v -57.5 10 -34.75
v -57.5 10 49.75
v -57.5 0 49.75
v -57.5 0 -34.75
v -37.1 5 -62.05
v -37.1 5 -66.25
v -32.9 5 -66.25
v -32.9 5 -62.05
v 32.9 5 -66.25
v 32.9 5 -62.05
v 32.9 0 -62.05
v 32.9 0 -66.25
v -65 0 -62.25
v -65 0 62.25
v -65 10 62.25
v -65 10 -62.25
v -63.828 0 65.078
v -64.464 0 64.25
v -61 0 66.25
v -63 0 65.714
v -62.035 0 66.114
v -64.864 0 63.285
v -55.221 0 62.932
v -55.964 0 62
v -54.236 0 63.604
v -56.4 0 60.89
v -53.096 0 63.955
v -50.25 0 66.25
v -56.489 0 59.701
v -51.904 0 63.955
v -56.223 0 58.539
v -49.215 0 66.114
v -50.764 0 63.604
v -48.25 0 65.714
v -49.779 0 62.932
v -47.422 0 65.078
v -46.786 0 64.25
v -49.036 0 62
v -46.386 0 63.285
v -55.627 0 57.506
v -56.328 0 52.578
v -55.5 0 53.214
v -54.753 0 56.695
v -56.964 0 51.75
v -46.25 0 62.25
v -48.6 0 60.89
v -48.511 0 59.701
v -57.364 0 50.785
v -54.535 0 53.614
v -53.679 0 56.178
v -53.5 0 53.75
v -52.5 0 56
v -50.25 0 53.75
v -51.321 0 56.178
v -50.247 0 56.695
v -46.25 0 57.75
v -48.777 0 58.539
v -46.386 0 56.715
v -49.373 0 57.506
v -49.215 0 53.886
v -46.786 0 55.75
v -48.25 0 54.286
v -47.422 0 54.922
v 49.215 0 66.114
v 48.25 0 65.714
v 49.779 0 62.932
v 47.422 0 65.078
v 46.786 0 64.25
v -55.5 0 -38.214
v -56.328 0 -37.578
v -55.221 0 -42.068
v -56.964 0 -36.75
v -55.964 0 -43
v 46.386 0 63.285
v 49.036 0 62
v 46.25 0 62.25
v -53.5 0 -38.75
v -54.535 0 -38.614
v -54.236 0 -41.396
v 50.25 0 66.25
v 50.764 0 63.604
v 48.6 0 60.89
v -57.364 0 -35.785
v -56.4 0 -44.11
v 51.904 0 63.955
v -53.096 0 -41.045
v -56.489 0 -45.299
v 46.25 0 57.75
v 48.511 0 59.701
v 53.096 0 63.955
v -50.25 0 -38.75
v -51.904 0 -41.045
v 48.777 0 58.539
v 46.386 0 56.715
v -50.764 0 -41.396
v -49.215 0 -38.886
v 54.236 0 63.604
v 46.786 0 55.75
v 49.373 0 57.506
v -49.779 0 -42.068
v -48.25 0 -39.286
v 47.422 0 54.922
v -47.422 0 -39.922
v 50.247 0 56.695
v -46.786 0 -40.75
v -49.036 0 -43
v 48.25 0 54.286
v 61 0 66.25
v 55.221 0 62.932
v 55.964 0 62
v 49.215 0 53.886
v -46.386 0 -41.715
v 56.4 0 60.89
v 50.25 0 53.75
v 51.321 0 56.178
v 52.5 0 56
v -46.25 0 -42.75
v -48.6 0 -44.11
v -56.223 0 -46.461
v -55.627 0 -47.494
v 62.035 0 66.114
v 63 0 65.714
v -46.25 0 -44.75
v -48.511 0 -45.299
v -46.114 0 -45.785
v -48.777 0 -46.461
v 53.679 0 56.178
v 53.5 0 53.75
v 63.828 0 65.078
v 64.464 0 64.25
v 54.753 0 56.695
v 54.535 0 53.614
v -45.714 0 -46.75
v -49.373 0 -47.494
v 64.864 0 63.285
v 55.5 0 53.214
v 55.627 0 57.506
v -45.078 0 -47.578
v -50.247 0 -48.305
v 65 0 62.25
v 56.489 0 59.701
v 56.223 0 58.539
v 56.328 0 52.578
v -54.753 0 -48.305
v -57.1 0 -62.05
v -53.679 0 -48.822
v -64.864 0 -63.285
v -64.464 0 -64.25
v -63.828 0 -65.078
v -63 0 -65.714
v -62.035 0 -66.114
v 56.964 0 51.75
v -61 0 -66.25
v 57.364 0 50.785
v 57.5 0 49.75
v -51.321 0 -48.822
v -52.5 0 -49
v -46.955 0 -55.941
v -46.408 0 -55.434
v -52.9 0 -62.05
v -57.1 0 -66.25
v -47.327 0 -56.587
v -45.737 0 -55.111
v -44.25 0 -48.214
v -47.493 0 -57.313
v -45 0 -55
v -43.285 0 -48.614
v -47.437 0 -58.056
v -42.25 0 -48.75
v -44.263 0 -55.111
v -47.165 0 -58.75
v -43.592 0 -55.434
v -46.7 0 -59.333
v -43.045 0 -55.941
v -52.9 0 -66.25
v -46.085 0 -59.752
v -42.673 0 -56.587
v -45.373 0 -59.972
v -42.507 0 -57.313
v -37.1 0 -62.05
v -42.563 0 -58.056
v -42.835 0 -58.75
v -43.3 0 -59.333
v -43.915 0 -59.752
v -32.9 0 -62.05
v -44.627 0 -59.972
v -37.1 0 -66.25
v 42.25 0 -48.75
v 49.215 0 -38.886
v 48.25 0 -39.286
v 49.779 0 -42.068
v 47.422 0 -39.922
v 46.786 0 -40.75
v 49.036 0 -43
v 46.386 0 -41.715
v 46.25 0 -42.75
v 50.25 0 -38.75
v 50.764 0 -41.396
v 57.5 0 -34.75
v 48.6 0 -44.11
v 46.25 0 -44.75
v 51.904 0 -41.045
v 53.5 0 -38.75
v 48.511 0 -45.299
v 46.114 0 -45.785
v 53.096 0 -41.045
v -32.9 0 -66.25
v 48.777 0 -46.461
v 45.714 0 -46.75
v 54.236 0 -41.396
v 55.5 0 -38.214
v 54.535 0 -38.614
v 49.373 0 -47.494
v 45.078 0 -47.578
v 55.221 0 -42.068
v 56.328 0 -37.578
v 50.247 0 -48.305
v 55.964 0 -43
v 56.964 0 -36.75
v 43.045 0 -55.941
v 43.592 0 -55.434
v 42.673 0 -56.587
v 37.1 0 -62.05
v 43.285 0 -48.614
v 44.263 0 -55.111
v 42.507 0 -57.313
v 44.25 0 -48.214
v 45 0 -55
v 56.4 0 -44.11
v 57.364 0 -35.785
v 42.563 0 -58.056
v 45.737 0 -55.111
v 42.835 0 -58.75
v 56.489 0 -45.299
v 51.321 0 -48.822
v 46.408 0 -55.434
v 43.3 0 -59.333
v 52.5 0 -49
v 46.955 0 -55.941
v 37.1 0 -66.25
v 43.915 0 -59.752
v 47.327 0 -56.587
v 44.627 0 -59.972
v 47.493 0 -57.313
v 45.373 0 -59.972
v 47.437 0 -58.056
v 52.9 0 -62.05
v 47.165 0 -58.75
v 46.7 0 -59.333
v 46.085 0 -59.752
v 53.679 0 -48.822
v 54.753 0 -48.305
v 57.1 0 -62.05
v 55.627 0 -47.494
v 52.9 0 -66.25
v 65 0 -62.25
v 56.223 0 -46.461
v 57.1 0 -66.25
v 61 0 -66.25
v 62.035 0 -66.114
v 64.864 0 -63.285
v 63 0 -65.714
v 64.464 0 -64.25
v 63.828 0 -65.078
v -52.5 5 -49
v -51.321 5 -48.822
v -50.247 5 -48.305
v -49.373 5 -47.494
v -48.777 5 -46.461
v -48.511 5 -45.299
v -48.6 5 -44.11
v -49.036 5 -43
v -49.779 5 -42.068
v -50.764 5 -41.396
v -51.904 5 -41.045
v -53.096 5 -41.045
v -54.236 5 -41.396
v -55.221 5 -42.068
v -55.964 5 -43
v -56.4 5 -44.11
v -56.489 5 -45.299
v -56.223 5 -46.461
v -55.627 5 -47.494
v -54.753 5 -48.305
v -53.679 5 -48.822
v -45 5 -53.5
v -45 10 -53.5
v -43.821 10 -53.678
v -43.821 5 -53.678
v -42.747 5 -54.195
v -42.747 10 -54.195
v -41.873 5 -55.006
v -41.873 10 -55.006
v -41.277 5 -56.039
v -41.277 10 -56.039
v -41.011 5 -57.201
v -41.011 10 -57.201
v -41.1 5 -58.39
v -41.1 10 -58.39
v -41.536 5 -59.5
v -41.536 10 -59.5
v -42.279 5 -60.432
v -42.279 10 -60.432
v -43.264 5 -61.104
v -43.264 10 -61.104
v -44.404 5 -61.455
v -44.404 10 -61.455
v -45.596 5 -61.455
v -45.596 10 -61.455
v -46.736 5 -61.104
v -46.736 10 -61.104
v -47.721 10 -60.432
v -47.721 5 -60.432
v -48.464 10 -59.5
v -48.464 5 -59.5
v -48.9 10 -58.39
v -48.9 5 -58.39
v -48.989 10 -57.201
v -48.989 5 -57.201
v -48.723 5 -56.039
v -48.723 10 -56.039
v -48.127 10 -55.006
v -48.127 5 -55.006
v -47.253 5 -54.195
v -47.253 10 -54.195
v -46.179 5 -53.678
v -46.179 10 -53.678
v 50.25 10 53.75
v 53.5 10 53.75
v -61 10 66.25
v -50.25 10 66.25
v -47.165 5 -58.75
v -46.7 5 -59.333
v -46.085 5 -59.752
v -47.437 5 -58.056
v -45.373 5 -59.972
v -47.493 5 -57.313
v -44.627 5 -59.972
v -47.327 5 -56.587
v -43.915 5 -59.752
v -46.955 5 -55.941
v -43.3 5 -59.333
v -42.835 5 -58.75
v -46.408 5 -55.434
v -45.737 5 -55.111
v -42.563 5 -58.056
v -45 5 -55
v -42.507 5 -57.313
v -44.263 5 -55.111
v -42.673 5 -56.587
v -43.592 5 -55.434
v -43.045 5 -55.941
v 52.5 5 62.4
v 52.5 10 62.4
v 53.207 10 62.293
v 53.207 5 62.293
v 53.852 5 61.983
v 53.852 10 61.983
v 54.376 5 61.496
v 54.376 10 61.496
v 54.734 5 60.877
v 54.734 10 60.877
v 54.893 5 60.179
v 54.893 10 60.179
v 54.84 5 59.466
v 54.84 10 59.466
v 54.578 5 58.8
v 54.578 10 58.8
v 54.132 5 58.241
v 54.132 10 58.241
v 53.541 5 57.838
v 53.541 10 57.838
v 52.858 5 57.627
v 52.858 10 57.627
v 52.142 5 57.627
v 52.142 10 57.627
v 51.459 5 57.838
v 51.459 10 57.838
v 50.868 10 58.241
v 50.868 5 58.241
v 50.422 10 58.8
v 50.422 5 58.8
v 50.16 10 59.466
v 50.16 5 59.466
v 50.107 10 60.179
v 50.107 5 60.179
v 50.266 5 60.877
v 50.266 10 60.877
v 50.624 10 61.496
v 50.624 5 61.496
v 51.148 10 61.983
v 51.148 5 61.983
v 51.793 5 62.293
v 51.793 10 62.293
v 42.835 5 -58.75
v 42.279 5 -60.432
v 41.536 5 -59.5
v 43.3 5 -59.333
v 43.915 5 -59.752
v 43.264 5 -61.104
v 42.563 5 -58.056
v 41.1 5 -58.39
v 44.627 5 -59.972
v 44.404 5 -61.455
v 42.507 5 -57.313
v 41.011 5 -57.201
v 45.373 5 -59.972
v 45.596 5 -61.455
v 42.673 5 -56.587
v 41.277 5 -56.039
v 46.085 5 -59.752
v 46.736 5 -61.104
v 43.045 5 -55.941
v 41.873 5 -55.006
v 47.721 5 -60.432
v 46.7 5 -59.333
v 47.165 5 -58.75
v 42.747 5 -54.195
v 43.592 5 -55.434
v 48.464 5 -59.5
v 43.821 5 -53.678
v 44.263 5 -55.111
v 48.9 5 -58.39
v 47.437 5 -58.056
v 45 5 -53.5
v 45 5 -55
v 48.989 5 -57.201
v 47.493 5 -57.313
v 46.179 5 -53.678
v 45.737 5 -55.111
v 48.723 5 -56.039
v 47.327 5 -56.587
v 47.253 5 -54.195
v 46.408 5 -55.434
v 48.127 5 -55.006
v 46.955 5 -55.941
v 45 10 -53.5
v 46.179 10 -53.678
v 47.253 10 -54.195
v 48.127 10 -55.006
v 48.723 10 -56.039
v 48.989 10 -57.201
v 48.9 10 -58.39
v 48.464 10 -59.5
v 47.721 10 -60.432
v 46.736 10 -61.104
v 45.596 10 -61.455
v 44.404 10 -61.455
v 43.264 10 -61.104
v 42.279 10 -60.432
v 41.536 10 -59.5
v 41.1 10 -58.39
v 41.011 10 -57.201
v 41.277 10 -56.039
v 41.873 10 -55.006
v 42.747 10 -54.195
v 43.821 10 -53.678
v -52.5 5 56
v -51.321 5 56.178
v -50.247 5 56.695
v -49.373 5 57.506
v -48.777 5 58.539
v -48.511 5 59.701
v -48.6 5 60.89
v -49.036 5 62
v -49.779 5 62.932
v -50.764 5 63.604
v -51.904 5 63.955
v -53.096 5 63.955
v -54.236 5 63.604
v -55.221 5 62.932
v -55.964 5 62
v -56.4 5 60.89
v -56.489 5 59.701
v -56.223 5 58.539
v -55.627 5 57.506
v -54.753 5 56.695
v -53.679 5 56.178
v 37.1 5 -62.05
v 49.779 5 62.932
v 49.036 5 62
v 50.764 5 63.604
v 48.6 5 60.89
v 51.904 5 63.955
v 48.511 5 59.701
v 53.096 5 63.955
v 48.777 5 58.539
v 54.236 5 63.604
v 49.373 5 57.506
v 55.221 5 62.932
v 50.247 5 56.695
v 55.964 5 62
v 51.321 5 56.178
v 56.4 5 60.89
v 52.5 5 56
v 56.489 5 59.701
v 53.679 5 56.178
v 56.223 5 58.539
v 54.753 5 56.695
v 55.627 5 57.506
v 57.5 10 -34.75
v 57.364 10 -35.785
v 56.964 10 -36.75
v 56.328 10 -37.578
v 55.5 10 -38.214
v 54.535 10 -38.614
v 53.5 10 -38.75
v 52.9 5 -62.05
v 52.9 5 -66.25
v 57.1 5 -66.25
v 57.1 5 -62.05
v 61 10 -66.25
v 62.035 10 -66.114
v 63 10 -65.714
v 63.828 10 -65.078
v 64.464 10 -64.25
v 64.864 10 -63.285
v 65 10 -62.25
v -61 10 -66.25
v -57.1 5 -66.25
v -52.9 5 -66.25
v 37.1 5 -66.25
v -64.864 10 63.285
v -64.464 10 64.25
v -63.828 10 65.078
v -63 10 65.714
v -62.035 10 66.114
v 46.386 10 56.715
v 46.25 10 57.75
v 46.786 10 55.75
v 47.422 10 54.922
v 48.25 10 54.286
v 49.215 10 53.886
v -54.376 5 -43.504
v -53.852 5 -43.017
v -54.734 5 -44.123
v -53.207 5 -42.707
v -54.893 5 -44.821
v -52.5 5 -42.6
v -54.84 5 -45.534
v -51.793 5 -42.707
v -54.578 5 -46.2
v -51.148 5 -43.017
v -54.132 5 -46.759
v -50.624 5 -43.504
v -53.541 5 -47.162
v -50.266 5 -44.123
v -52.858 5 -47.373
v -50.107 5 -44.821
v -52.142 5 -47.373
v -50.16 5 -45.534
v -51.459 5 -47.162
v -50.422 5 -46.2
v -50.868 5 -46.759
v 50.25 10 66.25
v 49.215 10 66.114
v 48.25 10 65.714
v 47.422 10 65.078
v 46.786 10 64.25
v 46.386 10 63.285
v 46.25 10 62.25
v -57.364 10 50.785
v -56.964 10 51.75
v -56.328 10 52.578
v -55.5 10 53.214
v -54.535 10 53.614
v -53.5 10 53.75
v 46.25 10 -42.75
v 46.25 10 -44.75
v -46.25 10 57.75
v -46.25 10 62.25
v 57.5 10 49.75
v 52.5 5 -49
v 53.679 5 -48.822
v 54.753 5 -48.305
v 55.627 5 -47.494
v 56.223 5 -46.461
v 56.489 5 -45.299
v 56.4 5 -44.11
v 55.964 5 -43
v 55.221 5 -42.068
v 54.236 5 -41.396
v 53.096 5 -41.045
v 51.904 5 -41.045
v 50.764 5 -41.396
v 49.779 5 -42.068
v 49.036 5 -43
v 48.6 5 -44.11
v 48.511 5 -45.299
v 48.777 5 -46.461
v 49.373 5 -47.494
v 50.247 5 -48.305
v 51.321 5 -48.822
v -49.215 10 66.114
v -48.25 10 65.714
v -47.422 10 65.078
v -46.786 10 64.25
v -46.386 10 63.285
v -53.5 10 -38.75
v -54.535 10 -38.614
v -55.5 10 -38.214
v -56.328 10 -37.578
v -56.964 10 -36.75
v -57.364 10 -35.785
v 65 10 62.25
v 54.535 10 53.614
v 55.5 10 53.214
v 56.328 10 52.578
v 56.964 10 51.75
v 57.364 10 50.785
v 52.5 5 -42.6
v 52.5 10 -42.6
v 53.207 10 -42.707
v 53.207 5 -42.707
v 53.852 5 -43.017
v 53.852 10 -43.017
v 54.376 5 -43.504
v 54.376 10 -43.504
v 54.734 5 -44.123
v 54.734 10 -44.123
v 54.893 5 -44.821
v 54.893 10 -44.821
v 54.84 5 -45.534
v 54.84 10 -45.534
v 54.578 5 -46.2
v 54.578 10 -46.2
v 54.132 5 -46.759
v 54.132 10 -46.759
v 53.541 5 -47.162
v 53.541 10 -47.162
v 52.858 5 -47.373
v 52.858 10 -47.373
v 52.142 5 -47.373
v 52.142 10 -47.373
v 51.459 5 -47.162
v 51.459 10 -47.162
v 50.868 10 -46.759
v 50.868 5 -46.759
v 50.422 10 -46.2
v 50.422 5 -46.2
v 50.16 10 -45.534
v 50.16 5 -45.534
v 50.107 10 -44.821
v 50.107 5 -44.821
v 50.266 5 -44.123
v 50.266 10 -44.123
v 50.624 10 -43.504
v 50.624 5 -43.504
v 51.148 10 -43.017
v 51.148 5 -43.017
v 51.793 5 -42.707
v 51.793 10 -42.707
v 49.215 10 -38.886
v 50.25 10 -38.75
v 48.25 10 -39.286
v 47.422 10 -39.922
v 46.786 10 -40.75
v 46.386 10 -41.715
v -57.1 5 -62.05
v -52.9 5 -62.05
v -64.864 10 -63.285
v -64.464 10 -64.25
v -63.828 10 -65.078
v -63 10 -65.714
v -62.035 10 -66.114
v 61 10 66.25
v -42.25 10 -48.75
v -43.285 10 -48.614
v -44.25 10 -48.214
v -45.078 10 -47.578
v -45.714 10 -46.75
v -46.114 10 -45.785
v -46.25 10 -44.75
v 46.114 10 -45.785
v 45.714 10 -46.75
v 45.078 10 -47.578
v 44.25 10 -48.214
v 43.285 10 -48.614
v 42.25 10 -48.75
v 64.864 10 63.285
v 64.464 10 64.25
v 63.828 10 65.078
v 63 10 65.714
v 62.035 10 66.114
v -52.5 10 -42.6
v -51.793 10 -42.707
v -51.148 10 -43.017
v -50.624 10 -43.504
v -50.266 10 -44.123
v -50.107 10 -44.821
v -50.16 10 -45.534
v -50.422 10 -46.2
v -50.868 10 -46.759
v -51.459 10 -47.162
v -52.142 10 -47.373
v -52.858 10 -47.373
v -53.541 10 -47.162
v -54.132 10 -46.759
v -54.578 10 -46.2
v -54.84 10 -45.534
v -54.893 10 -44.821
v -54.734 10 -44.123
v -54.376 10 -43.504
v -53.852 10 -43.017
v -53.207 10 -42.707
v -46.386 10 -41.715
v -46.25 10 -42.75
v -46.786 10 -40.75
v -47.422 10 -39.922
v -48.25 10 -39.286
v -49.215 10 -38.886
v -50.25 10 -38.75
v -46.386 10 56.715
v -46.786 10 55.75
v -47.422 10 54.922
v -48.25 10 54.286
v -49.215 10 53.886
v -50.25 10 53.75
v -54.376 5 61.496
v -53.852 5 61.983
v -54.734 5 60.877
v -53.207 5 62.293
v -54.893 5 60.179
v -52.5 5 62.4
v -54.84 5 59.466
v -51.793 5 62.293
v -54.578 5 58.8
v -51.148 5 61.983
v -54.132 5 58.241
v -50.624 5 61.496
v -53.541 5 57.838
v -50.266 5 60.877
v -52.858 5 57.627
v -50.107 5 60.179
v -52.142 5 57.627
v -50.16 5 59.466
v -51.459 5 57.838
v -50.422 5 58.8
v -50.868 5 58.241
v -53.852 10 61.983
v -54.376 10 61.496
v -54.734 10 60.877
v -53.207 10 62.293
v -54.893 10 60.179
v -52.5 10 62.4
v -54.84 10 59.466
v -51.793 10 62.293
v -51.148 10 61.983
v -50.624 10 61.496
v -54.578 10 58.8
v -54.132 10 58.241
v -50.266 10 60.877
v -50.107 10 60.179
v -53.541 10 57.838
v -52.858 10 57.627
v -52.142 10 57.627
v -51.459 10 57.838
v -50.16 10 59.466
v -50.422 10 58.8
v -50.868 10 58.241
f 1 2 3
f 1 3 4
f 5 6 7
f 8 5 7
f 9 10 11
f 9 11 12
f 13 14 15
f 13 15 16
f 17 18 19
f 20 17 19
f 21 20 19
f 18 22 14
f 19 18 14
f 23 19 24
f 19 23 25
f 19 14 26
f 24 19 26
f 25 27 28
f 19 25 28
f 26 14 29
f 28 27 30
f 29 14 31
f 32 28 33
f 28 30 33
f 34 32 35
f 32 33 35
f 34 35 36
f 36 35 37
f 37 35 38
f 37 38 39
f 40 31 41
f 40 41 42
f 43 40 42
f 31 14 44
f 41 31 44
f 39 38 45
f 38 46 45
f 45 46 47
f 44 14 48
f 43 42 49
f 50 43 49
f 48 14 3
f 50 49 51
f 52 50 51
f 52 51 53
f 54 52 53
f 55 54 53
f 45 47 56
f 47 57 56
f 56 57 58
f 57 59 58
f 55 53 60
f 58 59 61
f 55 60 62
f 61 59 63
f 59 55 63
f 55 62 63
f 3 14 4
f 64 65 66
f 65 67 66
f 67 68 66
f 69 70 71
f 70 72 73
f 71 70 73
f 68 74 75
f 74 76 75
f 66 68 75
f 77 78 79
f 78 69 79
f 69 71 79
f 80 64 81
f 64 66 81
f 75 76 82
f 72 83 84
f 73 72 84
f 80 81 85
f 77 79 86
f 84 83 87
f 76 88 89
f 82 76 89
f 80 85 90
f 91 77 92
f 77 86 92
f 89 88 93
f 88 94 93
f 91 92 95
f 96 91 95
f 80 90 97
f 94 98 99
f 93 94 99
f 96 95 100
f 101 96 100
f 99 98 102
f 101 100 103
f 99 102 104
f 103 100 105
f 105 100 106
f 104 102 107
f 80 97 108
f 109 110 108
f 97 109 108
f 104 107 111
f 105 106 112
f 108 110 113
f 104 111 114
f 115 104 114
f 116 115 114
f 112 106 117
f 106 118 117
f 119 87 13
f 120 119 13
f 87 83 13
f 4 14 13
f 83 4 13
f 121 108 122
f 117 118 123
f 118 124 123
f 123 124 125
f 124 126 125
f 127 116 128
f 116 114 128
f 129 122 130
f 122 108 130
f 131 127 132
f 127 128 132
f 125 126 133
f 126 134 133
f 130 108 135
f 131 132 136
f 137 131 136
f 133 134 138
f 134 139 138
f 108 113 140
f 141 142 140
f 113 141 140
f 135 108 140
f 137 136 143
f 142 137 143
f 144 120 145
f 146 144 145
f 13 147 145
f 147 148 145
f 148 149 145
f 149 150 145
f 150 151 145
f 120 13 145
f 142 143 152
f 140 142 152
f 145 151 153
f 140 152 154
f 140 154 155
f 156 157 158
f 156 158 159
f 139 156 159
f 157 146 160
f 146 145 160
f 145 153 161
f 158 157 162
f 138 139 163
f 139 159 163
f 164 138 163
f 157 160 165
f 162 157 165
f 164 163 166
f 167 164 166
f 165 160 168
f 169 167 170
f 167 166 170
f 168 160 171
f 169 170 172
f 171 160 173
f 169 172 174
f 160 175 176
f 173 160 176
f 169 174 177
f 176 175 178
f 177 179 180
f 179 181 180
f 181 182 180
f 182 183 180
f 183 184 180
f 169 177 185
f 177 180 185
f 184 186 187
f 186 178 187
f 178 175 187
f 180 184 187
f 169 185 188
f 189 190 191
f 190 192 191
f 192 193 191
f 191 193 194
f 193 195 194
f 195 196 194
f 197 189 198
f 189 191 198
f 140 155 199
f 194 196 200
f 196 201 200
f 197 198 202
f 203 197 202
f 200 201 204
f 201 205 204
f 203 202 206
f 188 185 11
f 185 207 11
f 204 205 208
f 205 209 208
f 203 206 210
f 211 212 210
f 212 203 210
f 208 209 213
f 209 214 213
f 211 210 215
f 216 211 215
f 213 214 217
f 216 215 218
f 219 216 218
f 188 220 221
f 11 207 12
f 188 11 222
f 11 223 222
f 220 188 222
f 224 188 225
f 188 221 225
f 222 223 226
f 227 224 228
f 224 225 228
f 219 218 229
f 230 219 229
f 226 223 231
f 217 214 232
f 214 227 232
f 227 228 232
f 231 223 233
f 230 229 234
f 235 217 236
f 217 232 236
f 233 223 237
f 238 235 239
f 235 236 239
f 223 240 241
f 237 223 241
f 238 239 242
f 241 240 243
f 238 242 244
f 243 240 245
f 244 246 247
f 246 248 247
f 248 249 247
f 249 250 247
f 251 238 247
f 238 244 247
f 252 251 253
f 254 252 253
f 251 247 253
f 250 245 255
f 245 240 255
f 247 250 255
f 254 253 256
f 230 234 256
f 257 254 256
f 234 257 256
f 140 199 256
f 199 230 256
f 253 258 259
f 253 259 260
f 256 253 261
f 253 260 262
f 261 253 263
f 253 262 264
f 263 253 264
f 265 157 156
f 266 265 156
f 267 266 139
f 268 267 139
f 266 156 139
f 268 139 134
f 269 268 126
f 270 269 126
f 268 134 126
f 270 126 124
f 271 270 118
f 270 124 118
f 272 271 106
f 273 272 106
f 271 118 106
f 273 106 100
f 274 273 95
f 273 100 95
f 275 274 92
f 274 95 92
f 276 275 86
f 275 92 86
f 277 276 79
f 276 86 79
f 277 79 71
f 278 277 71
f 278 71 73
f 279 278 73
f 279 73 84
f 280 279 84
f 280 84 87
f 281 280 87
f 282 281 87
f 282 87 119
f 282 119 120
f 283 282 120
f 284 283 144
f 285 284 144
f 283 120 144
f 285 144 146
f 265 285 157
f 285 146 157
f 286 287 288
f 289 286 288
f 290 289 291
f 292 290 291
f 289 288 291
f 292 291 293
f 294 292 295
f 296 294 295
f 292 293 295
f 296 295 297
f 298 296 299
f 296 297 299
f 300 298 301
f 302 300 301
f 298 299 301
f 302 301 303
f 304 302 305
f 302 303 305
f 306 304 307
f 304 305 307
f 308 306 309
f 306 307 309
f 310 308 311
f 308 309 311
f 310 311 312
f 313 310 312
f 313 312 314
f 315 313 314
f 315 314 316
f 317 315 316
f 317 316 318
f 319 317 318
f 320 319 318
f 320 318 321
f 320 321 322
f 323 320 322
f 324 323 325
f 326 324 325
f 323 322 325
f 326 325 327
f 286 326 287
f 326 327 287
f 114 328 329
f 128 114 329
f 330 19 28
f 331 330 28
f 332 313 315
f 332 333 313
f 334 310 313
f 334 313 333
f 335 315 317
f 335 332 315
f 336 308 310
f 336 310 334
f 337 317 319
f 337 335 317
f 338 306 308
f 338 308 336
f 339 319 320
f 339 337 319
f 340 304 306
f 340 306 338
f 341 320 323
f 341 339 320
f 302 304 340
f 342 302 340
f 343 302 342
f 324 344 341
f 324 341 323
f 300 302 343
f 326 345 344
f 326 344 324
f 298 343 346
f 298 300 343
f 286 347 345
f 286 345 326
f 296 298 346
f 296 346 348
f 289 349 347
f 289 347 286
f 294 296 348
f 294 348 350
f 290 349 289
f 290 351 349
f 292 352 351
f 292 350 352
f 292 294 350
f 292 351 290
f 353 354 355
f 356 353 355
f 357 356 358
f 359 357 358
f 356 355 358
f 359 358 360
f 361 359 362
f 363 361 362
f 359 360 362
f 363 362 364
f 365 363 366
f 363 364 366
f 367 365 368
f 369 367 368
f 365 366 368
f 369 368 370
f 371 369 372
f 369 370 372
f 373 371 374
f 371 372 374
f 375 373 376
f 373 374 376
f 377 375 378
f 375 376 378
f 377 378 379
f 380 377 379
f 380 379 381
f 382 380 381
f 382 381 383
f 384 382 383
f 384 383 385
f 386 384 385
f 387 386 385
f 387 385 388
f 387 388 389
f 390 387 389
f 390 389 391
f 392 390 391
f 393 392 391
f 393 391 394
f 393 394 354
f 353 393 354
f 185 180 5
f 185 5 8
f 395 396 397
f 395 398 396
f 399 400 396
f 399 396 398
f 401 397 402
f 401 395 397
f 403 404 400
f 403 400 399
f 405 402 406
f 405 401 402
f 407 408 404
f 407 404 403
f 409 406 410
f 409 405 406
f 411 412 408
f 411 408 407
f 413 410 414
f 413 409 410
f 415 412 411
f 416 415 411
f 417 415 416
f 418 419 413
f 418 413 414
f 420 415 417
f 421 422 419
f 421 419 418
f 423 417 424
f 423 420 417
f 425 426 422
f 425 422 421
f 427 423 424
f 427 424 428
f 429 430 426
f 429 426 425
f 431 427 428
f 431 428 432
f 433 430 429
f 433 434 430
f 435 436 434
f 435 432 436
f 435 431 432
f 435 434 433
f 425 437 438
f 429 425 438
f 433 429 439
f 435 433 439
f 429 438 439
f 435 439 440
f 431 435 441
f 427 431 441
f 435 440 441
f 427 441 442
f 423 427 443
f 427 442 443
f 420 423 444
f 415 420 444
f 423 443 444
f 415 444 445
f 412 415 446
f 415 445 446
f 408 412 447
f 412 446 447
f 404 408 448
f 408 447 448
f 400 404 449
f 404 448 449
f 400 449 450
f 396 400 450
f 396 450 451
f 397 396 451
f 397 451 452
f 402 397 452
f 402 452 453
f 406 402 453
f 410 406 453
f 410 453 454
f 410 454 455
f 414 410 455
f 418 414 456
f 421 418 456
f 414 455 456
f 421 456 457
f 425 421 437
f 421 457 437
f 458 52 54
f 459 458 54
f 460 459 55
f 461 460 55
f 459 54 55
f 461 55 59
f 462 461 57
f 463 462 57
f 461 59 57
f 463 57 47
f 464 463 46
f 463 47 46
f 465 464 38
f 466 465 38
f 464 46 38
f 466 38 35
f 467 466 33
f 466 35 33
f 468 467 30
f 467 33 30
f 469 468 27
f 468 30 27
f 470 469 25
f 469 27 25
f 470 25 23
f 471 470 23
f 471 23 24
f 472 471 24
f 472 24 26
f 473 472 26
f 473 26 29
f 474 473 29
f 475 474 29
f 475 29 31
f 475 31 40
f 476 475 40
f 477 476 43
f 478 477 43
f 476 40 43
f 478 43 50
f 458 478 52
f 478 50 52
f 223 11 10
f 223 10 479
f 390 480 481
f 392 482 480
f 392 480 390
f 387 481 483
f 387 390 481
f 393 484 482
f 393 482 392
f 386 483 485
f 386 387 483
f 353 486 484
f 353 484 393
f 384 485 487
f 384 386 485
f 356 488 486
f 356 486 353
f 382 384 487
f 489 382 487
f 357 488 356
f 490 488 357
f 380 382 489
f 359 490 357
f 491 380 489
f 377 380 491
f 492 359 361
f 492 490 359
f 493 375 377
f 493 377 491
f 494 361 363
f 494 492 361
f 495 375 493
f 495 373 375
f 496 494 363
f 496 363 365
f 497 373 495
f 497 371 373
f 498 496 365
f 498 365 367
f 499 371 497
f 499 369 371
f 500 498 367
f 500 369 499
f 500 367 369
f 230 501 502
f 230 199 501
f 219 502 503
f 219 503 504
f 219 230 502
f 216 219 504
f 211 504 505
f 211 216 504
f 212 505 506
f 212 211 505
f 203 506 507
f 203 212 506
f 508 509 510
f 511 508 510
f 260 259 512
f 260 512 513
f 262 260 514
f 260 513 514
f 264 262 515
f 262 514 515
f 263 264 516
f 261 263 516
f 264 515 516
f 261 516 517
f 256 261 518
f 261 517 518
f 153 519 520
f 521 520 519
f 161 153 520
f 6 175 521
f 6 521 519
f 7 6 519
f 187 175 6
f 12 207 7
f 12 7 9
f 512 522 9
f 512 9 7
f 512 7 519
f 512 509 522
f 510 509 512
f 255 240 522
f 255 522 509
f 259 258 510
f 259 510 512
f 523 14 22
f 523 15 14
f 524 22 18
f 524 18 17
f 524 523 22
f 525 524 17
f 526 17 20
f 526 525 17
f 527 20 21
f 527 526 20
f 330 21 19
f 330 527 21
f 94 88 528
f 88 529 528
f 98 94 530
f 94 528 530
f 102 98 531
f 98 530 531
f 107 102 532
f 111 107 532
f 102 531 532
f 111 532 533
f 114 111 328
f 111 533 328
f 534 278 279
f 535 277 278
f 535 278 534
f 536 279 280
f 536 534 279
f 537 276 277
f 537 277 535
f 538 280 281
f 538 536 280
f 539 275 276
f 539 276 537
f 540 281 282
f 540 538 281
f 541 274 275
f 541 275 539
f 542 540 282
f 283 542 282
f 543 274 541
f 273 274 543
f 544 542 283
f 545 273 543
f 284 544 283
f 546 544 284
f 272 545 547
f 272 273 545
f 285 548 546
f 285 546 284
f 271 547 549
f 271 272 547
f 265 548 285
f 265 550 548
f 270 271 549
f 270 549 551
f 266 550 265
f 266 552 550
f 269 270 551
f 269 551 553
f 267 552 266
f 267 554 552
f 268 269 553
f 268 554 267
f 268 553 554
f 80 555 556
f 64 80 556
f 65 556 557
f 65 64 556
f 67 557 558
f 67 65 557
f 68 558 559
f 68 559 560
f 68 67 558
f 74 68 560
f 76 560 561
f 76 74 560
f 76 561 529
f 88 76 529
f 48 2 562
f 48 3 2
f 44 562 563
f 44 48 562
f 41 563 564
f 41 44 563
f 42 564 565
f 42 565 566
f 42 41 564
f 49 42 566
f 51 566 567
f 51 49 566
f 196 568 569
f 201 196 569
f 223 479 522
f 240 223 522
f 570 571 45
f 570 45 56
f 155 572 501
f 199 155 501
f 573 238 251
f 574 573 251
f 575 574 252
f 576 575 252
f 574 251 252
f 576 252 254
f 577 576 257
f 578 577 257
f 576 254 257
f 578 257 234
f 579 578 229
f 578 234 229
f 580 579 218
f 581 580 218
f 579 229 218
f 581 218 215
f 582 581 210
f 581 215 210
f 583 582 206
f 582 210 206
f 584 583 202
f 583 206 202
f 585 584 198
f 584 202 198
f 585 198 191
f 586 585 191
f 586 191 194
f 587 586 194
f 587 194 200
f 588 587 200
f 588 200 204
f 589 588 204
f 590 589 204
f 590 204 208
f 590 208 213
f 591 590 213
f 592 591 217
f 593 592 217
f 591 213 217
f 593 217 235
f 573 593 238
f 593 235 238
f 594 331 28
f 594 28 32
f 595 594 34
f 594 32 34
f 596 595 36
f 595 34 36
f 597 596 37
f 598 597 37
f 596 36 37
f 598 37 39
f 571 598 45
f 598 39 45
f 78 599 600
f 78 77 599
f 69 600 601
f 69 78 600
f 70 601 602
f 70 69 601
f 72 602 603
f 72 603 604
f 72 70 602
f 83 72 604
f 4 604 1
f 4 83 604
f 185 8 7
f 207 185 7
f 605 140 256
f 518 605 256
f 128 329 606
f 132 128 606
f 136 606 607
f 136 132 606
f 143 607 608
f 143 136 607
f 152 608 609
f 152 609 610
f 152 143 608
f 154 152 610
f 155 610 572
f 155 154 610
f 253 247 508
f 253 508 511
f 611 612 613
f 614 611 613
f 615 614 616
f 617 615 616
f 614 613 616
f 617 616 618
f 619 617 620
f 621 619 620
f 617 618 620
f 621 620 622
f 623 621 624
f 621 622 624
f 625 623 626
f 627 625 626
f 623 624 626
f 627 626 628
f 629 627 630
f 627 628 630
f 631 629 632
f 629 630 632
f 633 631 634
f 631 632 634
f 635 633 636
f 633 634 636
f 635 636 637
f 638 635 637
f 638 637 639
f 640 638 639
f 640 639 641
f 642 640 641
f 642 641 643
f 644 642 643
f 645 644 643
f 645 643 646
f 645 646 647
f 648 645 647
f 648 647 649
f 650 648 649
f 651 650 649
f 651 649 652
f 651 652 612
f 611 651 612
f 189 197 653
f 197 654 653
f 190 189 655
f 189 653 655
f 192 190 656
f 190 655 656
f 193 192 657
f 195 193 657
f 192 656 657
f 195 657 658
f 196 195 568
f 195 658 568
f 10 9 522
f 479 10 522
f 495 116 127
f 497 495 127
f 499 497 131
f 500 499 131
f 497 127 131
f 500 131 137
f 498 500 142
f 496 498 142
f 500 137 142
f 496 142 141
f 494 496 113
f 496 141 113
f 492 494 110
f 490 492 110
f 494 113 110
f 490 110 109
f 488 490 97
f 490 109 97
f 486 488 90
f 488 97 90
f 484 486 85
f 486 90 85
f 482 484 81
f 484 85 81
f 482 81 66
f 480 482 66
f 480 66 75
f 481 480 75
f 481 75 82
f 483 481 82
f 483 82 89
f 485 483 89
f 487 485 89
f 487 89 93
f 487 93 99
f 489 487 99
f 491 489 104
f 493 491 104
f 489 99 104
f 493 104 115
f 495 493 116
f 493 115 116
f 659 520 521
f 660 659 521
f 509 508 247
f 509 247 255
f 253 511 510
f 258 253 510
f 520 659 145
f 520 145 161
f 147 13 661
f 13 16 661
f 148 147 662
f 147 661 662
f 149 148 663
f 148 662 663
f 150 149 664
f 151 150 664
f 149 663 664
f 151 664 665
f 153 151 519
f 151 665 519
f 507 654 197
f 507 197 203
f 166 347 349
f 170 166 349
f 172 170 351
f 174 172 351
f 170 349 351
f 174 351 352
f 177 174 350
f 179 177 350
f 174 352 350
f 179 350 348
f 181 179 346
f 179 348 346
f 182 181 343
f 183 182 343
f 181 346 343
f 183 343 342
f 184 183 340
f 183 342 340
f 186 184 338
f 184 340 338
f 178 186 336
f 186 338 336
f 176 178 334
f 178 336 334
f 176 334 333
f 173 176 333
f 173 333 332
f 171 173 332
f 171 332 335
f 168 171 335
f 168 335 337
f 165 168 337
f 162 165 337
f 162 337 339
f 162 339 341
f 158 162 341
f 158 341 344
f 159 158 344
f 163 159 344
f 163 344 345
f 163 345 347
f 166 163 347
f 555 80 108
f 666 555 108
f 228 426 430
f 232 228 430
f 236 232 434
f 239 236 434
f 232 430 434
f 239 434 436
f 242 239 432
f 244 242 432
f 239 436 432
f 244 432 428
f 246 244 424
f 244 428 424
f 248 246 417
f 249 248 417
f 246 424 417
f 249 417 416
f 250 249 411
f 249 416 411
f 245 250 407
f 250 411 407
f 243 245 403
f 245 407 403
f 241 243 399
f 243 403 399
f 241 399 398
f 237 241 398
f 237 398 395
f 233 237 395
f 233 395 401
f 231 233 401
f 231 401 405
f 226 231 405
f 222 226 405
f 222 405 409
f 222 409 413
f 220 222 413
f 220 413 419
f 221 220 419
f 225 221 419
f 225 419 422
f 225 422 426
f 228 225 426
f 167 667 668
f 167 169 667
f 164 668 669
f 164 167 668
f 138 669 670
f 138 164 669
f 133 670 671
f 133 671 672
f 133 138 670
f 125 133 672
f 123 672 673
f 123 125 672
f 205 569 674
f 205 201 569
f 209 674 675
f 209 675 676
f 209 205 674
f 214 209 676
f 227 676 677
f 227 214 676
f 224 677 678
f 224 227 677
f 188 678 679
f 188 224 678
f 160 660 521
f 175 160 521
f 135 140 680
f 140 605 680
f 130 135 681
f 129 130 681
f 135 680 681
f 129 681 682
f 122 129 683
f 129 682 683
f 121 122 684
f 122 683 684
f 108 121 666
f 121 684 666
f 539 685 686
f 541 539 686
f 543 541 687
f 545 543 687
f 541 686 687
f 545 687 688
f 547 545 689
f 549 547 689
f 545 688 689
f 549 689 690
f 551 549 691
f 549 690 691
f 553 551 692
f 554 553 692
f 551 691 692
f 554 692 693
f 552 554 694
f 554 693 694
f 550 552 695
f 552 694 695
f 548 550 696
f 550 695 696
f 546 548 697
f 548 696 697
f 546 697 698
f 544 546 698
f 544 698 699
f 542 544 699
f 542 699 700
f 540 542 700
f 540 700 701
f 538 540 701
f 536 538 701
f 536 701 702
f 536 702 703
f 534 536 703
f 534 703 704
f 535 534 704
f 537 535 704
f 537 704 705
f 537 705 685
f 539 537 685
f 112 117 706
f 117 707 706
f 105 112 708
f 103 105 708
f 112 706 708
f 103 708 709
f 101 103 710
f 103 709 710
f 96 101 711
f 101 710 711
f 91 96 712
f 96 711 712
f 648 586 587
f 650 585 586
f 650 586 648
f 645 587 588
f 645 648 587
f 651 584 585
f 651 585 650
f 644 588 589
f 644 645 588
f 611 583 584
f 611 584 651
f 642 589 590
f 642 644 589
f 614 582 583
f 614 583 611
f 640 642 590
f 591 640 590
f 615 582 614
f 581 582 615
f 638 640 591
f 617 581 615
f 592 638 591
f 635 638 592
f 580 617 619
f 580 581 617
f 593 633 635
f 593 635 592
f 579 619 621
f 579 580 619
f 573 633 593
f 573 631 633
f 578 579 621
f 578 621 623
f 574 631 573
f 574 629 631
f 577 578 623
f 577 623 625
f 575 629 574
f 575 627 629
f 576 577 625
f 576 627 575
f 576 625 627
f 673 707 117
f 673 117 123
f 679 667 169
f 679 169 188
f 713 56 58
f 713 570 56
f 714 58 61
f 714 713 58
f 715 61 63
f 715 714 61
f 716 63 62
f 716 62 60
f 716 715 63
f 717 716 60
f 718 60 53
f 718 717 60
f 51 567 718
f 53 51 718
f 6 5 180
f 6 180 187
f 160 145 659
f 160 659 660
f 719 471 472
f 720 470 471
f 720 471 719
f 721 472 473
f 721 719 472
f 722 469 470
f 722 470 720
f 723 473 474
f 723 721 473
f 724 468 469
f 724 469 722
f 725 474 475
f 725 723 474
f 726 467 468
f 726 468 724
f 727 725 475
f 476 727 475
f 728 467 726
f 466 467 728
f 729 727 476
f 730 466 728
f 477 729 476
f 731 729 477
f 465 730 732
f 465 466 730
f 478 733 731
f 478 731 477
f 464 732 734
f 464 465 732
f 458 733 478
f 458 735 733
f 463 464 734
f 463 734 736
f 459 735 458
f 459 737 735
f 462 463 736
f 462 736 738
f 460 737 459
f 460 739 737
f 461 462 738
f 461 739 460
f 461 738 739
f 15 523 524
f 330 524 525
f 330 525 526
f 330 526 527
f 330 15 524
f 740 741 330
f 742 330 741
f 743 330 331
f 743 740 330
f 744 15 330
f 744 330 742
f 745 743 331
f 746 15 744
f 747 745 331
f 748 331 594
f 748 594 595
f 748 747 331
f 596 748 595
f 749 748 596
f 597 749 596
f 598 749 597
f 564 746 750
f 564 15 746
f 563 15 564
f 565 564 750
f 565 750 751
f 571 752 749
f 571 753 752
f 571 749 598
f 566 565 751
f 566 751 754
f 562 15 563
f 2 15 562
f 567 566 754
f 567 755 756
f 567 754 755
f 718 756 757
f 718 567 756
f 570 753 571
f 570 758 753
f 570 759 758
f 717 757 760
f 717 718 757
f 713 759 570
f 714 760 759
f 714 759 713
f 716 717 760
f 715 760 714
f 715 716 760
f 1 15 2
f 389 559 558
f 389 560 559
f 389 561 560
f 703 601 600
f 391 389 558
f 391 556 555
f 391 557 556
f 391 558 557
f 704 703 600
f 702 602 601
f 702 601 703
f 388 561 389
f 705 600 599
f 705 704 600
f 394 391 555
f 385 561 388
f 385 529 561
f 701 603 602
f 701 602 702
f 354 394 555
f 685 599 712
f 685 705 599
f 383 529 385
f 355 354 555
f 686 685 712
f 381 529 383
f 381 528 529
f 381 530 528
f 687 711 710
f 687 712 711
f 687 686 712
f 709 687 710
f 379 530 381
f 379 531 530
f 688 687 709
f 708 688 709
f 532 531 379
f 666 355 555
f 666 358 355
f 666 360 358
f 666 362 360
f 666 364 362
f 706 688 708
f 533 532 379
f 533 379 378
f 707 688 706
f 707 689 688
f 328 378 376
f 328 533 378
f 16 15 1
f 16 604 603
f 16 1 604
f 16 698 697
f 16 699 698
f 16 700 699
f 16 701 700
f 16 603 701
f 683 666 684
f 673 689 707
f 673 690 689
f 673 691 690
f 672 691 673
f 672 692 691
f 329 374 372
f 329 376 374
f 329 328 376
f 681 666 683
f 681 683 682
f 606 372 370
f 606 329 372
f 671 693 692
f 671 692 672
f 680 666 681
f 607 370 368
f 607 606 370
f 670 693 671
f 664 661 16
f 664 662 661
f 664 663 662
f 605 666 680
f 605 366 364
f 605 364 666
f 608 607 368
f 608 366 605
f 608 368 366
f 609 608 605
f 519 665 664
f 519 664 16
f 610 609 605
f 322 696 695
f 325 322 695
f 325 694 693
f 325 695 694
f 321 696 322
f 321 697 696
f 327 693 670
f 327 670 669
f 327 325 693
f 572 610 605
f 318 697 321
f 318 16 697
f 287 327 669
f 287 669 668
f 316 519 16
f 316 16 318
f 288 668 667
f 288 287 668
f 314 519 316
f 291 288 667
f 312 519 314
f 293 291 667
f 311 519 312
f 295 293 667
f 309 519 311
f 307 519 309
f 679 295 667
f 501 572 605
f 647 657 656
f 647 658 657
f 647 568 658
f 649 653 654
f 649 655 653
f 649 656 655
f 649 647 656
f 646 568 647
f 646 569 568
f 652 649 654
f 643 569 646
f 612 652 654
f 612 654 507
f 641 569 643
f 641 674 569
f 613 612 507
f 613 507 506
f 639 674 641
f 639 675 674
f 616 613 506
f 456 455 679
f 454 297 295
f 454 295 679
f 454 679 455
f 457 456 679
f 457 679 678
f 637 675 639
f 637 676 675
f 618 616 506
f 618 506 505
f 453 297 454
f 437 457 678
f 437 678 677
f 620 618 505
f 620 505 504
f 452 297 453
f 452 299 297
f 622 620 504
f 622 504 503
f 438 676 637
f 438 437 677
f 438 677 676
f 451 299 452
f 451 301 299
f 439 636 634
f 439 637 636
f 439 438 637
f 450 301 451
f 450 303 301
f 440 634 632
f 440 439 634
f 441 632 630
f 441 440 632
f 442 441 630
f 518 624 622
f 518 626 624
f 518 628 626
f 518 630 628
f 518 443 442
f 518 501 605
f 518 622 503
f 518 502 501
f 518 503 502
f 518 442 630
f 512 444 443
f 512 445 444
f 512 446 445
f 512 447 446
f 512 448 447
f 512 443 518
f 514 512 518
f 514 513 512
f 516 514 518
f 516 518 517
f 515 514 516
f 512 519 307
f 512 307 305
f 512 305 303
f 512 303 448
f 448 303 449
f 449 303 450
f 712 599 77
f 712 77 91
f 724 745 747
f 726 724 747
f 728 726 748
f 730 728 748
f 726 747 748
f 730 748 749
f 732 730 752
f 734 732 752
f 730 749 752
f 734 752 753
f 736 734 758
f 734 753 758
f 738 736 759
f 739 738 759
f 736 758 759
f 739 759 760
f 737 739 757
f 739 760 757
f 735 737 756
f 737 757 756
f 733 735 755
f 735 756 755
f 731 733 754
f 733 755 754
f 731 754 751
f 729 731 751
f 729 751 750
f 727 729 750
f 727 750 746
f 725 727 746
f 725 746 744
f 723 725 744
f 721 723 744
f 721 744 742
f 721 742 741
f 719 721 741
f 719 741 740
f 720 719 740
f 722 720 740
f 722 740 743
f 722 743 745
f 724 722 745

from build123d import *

# Parameters (mm, degrees)
SKETCH1_W           = 130
SKETCH1_H           = 132.5
BOSS_EXTRUDE1_DEPTH = 10
SKETCH2_R           = 2.4
CUT_EXTRUDE1_DEPTH  = 94.349143006
SKETCH3_W           = 115
SKETCH3_H           = 92.5
CUT_EXTRUDE2_DEPTH  = 94.349143006
SKETCH5_W           = 92.5
SKETCH5_H           = 115
CUT_EXTRUDE3_DEPTH  = 94.349143006
FILLET1_R           = 4
SKETCH6_R           = 2.5
CUT_EXTRUDE4_DEPTH  = 10
SKETCH7_R           = 4
CUT_EXTRUDE5_DEPTH  = 5
SKETCH8_W           = 4.2
SKETCH8_H           = 4.2
CUT_EXTRUDE6_DEPTH  = 5
SKETCH9_R           = 4
CUT_EXTRUDE7_DEPTH  = 5


with BuildPart() as part:
    # Sketch1 → Boss-Extrude1 (new body)
    with BuildSketch(Plane(origin=(0, 0, 0), x_dir=(1, 0, 0), z_dir=(0, 1, 0))):
        Rectangle(SKETCH1_W, SKETCH1_H)
    extrude(amount=BOSS_EXTRUDE1_DEPTH)

    # Sketch2 → Cut-Extrude1 (cut, through all)
    with BuildSketch(Plane(origin=(0, 10, 0), x_dir=(1, 0, 0), z_dir=(0, 1, 0))):
        with Locations(Location((-52.5, -60, 0), (0, 0, 270))):
            Circle(SKETCH2_R)
        with Locations(Location((52.5, -60, 0), (0, 0, 270))):
            Circle(SKETCH2_R)
        with Locations(Location((52.5, 45, 0), (0, 0, 270))):
            Circle(SKETCH2_R)
        with Locations(Location((-52.5, 45, 0), (0, 0, 270))):
            Circle(SKETCH2_R)
    extrude(amount=-CUT_EXTRUDE1_DEPTH, mode=Mode.SUBTRACT)

    # Sketch3 → Cut-Extrude2 (cut, through all)
    with BuildSketch(Plane(origin=(0, 10, 0), x_dir=(1, 0, 0), z_dir=(0, 1, 0))):
        with Locations((0, -7.5)):
            Rectangle(SKETCH3_W, SKETCH3_H)
    extrude(amount=-CUT_EXTRUDE2_DEPTH, mode=Mode.SUBTRACT)

    # Sketch5 → Cut-Extrude3 (cut, through all)
    with BuildSketch(Plane(origin=(0, 10, 0), x_dir=(1, 0, 0), z_dir=(0, 1, 0))):
        with Locations((0, -8.75)):
            Rectangle(SKETCH5_W, SKETCH5_H)
    extrude(amount=-CUT_EXTRUDE3_DEPTH, mode=Mode.SUBTRACT)

    # Fillet1
    fillet1_edges = [part.edges().sort_by_distance(p)[0] for p in [
        (-57.5, 5, 53.75),
        (-57.5, 5, -38.75),
        (57.5, 5, -38.75),
        (57.5, 5, 53.75),
        (46.25, 5, 53.75),
        (-46.25, 5, 53.75),
        (-46.25, 5, -38.75),
        (-46.25, 5, 66.25),
        (46.25, 5, -38.75),
        (46.25, 5, -48.75),
        (-46.25, 5, -48.75),
        (46.25, 5, 66.25),
        (65, 5, 66.25),
        (-65, 5, 66.25),
        (-65, 5, -66.25),
        (65, 5, -66.25),
    ]]
    fillet(fillet1_edges, radius=FILLET1_R)

    # Sketch6 → Cut-Extrude4 (cut)
    with BuildSketch(Plane(origin=(0, 10, 0), x_dir=(1, 0, 0), z_dir=(0, 1, 0))):
        with Locations(Location((-45, 57.5, 0), (0, 0, 270))):
            Circle(SKETCH6_R)
        with Locations(Location((45, 57.5, 0), (0, 0, 270))):
            Circle(SKETCH6_R)
    extrude(amount=-CUT_EXTRUDE4_DEPTH, mode=Mode.SUBTRACT)

    # Sketch7 → Cut-Extrude5 (cut)
    with BuildSketch(Plane(origin=(0, 10, 0), x_dir=(1, 0, 0), z_dir=(0, 1, 0))):
        with Locations(Location((-45, 57.5, 0), (0, 0, 270))):
            Circle(SKETCH7_R)
        with Locations(Location((45, 57.5, 0), (0, 0, 270))):
            Circle(SKETCH7_R)
    extrude(amount=-CUT_EXTRUDE5_DEPTH, mode=Mode.SUBTRACT)

    # Sketch8 → Cut-Extrude6 (cut)
    with BuildSketch(Plane(origin=(0, 0, 0), x_dir=(1, 0, 0), z_dir=(0, 1, 0))):
        with Locations((-55, 64.15)):
            Rectangle(SKETCH8_W, SKETCH8_H)
        with Locations((-35, 64.15)):
            Rectangle(SKETCH8_W, SKETCH8_H)
        with Locations((35, 64.15)):
            Rectangle(SKETCH8_W, SKETCH8_H)
        with Locations((55, 64.15)):
            Rectangle(SKETCH8_W, SKETCH8_H)
    extrude(amount=CUT_EXTRUDE6_DEPTH, mode=Mode.SUBTRACT)

    # Sketch9 → Cut-Extrude7 (cut)
    with BuildSketch(Plane.XZ):
        with Locations(Location((-52.5, 60, 0), (0, 0, 270))):
            Circle(SKETCH9_R)
        with Locations(Location((52.5, 60, 0), (0, 0, 270))):
            Circle(SKETCH9_R)
        with Locations(Location((-52.5, -45, 0), (0, 0, 270))):
            Circle(SKETCH9_R)
        with Locations(Location((52.5, -45, 0), (0, 0, 270))):
            Circle(SKETCH9_R)
    extrude(amount=-CUT_EXTRUDE7_DEPTH, mode=Mode.SUBTRACT)


solid = part.part
